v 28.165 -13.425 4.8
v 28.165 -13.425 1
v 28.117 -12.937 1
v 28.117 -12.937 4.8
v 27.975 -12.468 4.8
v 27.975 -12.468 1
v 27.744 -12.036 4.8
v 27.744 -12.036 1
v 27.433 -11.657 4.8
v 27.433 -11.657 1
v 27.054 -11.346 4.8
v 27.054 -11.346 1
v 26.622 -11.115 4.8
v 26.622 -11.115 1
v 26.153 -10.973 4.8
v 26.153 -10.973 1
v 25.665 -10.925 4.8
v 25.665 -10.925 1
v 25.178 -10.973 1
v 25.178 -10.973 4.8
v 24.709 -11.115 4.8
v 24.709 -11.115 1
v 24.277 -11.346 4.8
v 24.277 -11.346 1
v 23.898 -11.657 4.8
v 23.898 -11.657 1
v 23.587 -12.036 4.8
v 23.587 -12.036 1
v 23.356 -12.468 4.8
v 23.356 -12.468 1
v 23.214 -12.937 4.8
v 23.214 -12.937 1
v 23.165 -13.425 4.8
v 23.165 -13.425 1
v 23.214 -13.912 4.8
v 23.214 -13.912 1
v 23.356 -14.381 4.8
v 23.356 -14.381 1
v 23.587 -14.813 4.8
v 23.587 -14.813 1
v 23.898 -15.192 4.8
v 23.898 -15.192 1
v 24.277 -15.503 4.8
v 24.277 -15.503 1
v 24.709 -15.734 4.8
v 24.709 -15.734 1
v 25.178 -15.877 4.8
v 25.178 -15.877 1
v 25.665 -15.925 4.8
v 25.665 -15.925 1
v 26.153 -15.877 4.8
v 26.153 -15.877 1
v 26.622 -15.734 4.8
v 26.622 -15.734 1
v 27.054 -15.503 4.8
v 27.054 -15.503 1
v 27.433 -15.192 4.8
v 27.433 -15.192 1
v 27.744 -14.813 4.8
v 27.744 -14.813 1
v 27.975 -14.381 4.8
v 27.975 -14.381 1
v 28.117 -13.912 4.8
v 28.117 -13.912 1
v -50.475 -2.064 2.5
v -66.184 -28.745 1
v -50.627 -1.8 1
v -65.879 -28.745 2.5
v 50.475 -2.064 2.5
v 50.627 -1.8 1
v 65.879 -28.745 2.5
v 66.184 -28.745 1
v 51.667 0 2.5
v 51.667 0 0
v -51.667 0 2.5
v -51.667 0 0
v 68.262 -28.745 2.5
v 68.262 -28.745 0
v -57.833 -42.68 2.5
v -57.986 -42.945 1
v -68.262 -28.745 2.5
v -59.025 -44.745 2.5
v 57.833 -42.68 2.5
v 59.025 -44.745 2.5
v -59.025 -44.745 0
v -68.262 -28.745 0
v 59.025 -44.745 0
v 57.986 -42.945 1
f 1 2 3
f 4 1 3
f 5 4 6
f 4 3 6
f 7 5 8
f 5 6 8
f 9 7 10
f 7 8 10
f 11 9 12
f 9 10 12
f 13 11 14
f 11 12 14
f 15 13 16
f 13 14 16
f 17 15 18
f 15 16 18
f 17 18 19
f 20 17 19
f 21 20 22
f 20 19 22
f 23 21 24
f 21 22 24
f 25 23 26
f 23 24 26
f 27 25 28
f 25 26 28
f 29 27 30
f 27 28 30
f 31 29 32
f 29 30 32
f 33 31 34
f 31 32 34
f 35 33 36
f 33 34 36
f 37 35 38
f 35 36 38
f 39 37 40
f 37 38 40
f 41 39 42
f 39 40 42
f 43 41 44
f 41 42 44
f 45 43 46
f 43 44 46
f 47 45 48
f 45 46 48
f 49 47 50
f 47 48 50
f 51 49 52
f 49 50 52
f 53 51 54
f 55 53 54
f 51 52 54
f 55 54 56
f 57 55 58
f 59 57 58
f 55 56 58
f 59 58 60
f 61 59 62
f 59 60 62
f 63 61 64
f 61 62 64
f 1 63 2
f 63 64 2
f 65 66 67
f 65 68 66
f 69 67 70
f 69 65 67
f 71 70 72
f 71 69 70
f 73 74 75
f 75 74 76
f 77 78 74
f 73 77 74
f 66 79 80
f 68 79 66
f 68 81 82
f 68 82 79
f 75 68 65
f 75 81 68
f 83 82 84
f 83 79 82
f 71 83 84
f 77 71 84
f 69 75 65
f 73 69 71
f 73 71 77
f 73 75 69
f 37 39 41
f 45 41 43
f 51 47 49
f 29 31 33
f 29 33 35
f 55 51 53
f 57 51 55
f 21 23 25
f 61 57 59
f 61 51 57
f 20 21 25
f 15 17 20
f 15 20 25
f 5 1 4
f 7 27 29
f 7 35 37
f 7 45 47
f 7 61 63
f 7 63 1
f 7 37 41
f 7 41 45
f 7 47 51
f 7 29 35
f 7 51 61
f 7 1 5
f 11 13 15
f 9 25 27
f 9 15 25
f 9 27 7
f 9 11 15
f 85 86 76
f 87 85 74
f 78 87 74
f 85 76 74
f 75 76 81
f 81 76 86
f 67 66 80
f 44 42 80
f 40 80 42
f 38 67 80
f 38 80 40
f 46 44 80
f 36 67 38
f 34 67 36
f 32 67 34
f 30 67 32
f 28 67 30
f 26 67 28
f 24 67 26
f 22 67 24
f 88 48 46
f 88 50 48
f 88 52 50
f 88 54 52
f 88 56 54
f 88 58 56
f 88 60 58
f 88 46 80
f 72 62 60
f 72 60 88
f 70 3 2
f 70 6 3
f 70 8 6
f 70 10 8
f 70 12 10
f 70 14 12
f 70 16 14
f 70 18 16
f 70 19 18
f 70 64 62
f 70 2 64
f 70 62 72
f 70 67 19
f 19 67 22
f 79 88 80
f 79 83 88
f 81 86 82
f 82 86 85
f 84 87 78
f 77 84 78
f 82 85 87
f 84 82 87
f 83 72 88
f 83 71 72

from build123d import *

# Parameters (mm, degrees)
BOSS_EXTRU_1_DEPTH              = 1
EXTRU_MINCE1_DEPTH              = 1.5
EXTRU_MINCE1_TAPER              = -10
ENL_V_DE_MAT_EXTRU_MINCE1_DEPTH = 3.5000001
ESQUISSE4_R                     = 2.5
BOSS_EXTRU_2_DEPTH              = 3.8


with BuildPart() as part:
    # Esquisse1 → Boss.-Extru.1 (new body)
    with BuildSketch(Plane.XY):
        Polygon((-59.024791386, -44.744645862), (2.7, -44.744645862), (59.024791386, -44.744645862), (68.262395693, -28.744645862), (51.666666667, 0), (-51.666666667, 0), (-68.262395693, -28.744645862), align=None)
    extrude(amount=BOSS_EXTRU_1_DEPTH)

    # Esquisse2 → Extru.-Mince1 (add)
    with BuildSketch(Plane.XY.offset(1)):
        Polygon((-68.262395693, -28.744645862), (-59.024791386, -44.744645862), (59.024791386, -44.744645862), (68.262395693, -28.744645862), (51.666666667, 0), (-51.666666667, 0), align=None)
        Polygon((-66.183934724, -28.744645862), (-57.985560901, -42.944645862), (57.985560901, -42.944645862), (66.183934724, -28.744645862), (50.627436182, -1.8), (-50.627436182, -1.8), align=None, mode=Mode.SUBTRACT)
    extrude(amount=EXTRU_MINCE1_DEPTH, taper=EXTRU_MINCE1_TAPER)

    # Esquisse3 → Enlèv. de mat.-Extru.-Mince1 (cut, through all)
    with BuildSketch(Plane(origin=(0, 0, 0), x_dir=(-1, 0, 0), z_dir=(0, 0, -1))):
        Polygon((60.121756897, -46.644645862), (70.456326716, -28.744645862), (52.763632178, 1.9), (-52.763632178, 1.9), (-70.456326716, -28.744645862), (-60.121756897, -46.644645862), align=None)
        Polygon((59.024791386, -44.744645862), (68.262395693, -28.744645862), (51.666666667, 0), (-51.666666667, 0), (-68.262395693, -28.744645862), (-59.024791386, -44.744645862), align=None, mode=Mode.SUBTRACT)
    extrude(amount=-ENL_V_DE_MAT_EXTRU_MINCE1_DEPTH, mode=Mode.SUBTRACT)

    # Esquisse4 → Boss.-Extru.2 (add)
    with BuildSketch(Plane.XY.offset(1)):
        with Locations((25.665479371, -13.424541306)):
            Circle(ESQUISSE4_R)
    extrude(amount=BOSS_EXTRU_2_DEPTH)


solid = part.part
